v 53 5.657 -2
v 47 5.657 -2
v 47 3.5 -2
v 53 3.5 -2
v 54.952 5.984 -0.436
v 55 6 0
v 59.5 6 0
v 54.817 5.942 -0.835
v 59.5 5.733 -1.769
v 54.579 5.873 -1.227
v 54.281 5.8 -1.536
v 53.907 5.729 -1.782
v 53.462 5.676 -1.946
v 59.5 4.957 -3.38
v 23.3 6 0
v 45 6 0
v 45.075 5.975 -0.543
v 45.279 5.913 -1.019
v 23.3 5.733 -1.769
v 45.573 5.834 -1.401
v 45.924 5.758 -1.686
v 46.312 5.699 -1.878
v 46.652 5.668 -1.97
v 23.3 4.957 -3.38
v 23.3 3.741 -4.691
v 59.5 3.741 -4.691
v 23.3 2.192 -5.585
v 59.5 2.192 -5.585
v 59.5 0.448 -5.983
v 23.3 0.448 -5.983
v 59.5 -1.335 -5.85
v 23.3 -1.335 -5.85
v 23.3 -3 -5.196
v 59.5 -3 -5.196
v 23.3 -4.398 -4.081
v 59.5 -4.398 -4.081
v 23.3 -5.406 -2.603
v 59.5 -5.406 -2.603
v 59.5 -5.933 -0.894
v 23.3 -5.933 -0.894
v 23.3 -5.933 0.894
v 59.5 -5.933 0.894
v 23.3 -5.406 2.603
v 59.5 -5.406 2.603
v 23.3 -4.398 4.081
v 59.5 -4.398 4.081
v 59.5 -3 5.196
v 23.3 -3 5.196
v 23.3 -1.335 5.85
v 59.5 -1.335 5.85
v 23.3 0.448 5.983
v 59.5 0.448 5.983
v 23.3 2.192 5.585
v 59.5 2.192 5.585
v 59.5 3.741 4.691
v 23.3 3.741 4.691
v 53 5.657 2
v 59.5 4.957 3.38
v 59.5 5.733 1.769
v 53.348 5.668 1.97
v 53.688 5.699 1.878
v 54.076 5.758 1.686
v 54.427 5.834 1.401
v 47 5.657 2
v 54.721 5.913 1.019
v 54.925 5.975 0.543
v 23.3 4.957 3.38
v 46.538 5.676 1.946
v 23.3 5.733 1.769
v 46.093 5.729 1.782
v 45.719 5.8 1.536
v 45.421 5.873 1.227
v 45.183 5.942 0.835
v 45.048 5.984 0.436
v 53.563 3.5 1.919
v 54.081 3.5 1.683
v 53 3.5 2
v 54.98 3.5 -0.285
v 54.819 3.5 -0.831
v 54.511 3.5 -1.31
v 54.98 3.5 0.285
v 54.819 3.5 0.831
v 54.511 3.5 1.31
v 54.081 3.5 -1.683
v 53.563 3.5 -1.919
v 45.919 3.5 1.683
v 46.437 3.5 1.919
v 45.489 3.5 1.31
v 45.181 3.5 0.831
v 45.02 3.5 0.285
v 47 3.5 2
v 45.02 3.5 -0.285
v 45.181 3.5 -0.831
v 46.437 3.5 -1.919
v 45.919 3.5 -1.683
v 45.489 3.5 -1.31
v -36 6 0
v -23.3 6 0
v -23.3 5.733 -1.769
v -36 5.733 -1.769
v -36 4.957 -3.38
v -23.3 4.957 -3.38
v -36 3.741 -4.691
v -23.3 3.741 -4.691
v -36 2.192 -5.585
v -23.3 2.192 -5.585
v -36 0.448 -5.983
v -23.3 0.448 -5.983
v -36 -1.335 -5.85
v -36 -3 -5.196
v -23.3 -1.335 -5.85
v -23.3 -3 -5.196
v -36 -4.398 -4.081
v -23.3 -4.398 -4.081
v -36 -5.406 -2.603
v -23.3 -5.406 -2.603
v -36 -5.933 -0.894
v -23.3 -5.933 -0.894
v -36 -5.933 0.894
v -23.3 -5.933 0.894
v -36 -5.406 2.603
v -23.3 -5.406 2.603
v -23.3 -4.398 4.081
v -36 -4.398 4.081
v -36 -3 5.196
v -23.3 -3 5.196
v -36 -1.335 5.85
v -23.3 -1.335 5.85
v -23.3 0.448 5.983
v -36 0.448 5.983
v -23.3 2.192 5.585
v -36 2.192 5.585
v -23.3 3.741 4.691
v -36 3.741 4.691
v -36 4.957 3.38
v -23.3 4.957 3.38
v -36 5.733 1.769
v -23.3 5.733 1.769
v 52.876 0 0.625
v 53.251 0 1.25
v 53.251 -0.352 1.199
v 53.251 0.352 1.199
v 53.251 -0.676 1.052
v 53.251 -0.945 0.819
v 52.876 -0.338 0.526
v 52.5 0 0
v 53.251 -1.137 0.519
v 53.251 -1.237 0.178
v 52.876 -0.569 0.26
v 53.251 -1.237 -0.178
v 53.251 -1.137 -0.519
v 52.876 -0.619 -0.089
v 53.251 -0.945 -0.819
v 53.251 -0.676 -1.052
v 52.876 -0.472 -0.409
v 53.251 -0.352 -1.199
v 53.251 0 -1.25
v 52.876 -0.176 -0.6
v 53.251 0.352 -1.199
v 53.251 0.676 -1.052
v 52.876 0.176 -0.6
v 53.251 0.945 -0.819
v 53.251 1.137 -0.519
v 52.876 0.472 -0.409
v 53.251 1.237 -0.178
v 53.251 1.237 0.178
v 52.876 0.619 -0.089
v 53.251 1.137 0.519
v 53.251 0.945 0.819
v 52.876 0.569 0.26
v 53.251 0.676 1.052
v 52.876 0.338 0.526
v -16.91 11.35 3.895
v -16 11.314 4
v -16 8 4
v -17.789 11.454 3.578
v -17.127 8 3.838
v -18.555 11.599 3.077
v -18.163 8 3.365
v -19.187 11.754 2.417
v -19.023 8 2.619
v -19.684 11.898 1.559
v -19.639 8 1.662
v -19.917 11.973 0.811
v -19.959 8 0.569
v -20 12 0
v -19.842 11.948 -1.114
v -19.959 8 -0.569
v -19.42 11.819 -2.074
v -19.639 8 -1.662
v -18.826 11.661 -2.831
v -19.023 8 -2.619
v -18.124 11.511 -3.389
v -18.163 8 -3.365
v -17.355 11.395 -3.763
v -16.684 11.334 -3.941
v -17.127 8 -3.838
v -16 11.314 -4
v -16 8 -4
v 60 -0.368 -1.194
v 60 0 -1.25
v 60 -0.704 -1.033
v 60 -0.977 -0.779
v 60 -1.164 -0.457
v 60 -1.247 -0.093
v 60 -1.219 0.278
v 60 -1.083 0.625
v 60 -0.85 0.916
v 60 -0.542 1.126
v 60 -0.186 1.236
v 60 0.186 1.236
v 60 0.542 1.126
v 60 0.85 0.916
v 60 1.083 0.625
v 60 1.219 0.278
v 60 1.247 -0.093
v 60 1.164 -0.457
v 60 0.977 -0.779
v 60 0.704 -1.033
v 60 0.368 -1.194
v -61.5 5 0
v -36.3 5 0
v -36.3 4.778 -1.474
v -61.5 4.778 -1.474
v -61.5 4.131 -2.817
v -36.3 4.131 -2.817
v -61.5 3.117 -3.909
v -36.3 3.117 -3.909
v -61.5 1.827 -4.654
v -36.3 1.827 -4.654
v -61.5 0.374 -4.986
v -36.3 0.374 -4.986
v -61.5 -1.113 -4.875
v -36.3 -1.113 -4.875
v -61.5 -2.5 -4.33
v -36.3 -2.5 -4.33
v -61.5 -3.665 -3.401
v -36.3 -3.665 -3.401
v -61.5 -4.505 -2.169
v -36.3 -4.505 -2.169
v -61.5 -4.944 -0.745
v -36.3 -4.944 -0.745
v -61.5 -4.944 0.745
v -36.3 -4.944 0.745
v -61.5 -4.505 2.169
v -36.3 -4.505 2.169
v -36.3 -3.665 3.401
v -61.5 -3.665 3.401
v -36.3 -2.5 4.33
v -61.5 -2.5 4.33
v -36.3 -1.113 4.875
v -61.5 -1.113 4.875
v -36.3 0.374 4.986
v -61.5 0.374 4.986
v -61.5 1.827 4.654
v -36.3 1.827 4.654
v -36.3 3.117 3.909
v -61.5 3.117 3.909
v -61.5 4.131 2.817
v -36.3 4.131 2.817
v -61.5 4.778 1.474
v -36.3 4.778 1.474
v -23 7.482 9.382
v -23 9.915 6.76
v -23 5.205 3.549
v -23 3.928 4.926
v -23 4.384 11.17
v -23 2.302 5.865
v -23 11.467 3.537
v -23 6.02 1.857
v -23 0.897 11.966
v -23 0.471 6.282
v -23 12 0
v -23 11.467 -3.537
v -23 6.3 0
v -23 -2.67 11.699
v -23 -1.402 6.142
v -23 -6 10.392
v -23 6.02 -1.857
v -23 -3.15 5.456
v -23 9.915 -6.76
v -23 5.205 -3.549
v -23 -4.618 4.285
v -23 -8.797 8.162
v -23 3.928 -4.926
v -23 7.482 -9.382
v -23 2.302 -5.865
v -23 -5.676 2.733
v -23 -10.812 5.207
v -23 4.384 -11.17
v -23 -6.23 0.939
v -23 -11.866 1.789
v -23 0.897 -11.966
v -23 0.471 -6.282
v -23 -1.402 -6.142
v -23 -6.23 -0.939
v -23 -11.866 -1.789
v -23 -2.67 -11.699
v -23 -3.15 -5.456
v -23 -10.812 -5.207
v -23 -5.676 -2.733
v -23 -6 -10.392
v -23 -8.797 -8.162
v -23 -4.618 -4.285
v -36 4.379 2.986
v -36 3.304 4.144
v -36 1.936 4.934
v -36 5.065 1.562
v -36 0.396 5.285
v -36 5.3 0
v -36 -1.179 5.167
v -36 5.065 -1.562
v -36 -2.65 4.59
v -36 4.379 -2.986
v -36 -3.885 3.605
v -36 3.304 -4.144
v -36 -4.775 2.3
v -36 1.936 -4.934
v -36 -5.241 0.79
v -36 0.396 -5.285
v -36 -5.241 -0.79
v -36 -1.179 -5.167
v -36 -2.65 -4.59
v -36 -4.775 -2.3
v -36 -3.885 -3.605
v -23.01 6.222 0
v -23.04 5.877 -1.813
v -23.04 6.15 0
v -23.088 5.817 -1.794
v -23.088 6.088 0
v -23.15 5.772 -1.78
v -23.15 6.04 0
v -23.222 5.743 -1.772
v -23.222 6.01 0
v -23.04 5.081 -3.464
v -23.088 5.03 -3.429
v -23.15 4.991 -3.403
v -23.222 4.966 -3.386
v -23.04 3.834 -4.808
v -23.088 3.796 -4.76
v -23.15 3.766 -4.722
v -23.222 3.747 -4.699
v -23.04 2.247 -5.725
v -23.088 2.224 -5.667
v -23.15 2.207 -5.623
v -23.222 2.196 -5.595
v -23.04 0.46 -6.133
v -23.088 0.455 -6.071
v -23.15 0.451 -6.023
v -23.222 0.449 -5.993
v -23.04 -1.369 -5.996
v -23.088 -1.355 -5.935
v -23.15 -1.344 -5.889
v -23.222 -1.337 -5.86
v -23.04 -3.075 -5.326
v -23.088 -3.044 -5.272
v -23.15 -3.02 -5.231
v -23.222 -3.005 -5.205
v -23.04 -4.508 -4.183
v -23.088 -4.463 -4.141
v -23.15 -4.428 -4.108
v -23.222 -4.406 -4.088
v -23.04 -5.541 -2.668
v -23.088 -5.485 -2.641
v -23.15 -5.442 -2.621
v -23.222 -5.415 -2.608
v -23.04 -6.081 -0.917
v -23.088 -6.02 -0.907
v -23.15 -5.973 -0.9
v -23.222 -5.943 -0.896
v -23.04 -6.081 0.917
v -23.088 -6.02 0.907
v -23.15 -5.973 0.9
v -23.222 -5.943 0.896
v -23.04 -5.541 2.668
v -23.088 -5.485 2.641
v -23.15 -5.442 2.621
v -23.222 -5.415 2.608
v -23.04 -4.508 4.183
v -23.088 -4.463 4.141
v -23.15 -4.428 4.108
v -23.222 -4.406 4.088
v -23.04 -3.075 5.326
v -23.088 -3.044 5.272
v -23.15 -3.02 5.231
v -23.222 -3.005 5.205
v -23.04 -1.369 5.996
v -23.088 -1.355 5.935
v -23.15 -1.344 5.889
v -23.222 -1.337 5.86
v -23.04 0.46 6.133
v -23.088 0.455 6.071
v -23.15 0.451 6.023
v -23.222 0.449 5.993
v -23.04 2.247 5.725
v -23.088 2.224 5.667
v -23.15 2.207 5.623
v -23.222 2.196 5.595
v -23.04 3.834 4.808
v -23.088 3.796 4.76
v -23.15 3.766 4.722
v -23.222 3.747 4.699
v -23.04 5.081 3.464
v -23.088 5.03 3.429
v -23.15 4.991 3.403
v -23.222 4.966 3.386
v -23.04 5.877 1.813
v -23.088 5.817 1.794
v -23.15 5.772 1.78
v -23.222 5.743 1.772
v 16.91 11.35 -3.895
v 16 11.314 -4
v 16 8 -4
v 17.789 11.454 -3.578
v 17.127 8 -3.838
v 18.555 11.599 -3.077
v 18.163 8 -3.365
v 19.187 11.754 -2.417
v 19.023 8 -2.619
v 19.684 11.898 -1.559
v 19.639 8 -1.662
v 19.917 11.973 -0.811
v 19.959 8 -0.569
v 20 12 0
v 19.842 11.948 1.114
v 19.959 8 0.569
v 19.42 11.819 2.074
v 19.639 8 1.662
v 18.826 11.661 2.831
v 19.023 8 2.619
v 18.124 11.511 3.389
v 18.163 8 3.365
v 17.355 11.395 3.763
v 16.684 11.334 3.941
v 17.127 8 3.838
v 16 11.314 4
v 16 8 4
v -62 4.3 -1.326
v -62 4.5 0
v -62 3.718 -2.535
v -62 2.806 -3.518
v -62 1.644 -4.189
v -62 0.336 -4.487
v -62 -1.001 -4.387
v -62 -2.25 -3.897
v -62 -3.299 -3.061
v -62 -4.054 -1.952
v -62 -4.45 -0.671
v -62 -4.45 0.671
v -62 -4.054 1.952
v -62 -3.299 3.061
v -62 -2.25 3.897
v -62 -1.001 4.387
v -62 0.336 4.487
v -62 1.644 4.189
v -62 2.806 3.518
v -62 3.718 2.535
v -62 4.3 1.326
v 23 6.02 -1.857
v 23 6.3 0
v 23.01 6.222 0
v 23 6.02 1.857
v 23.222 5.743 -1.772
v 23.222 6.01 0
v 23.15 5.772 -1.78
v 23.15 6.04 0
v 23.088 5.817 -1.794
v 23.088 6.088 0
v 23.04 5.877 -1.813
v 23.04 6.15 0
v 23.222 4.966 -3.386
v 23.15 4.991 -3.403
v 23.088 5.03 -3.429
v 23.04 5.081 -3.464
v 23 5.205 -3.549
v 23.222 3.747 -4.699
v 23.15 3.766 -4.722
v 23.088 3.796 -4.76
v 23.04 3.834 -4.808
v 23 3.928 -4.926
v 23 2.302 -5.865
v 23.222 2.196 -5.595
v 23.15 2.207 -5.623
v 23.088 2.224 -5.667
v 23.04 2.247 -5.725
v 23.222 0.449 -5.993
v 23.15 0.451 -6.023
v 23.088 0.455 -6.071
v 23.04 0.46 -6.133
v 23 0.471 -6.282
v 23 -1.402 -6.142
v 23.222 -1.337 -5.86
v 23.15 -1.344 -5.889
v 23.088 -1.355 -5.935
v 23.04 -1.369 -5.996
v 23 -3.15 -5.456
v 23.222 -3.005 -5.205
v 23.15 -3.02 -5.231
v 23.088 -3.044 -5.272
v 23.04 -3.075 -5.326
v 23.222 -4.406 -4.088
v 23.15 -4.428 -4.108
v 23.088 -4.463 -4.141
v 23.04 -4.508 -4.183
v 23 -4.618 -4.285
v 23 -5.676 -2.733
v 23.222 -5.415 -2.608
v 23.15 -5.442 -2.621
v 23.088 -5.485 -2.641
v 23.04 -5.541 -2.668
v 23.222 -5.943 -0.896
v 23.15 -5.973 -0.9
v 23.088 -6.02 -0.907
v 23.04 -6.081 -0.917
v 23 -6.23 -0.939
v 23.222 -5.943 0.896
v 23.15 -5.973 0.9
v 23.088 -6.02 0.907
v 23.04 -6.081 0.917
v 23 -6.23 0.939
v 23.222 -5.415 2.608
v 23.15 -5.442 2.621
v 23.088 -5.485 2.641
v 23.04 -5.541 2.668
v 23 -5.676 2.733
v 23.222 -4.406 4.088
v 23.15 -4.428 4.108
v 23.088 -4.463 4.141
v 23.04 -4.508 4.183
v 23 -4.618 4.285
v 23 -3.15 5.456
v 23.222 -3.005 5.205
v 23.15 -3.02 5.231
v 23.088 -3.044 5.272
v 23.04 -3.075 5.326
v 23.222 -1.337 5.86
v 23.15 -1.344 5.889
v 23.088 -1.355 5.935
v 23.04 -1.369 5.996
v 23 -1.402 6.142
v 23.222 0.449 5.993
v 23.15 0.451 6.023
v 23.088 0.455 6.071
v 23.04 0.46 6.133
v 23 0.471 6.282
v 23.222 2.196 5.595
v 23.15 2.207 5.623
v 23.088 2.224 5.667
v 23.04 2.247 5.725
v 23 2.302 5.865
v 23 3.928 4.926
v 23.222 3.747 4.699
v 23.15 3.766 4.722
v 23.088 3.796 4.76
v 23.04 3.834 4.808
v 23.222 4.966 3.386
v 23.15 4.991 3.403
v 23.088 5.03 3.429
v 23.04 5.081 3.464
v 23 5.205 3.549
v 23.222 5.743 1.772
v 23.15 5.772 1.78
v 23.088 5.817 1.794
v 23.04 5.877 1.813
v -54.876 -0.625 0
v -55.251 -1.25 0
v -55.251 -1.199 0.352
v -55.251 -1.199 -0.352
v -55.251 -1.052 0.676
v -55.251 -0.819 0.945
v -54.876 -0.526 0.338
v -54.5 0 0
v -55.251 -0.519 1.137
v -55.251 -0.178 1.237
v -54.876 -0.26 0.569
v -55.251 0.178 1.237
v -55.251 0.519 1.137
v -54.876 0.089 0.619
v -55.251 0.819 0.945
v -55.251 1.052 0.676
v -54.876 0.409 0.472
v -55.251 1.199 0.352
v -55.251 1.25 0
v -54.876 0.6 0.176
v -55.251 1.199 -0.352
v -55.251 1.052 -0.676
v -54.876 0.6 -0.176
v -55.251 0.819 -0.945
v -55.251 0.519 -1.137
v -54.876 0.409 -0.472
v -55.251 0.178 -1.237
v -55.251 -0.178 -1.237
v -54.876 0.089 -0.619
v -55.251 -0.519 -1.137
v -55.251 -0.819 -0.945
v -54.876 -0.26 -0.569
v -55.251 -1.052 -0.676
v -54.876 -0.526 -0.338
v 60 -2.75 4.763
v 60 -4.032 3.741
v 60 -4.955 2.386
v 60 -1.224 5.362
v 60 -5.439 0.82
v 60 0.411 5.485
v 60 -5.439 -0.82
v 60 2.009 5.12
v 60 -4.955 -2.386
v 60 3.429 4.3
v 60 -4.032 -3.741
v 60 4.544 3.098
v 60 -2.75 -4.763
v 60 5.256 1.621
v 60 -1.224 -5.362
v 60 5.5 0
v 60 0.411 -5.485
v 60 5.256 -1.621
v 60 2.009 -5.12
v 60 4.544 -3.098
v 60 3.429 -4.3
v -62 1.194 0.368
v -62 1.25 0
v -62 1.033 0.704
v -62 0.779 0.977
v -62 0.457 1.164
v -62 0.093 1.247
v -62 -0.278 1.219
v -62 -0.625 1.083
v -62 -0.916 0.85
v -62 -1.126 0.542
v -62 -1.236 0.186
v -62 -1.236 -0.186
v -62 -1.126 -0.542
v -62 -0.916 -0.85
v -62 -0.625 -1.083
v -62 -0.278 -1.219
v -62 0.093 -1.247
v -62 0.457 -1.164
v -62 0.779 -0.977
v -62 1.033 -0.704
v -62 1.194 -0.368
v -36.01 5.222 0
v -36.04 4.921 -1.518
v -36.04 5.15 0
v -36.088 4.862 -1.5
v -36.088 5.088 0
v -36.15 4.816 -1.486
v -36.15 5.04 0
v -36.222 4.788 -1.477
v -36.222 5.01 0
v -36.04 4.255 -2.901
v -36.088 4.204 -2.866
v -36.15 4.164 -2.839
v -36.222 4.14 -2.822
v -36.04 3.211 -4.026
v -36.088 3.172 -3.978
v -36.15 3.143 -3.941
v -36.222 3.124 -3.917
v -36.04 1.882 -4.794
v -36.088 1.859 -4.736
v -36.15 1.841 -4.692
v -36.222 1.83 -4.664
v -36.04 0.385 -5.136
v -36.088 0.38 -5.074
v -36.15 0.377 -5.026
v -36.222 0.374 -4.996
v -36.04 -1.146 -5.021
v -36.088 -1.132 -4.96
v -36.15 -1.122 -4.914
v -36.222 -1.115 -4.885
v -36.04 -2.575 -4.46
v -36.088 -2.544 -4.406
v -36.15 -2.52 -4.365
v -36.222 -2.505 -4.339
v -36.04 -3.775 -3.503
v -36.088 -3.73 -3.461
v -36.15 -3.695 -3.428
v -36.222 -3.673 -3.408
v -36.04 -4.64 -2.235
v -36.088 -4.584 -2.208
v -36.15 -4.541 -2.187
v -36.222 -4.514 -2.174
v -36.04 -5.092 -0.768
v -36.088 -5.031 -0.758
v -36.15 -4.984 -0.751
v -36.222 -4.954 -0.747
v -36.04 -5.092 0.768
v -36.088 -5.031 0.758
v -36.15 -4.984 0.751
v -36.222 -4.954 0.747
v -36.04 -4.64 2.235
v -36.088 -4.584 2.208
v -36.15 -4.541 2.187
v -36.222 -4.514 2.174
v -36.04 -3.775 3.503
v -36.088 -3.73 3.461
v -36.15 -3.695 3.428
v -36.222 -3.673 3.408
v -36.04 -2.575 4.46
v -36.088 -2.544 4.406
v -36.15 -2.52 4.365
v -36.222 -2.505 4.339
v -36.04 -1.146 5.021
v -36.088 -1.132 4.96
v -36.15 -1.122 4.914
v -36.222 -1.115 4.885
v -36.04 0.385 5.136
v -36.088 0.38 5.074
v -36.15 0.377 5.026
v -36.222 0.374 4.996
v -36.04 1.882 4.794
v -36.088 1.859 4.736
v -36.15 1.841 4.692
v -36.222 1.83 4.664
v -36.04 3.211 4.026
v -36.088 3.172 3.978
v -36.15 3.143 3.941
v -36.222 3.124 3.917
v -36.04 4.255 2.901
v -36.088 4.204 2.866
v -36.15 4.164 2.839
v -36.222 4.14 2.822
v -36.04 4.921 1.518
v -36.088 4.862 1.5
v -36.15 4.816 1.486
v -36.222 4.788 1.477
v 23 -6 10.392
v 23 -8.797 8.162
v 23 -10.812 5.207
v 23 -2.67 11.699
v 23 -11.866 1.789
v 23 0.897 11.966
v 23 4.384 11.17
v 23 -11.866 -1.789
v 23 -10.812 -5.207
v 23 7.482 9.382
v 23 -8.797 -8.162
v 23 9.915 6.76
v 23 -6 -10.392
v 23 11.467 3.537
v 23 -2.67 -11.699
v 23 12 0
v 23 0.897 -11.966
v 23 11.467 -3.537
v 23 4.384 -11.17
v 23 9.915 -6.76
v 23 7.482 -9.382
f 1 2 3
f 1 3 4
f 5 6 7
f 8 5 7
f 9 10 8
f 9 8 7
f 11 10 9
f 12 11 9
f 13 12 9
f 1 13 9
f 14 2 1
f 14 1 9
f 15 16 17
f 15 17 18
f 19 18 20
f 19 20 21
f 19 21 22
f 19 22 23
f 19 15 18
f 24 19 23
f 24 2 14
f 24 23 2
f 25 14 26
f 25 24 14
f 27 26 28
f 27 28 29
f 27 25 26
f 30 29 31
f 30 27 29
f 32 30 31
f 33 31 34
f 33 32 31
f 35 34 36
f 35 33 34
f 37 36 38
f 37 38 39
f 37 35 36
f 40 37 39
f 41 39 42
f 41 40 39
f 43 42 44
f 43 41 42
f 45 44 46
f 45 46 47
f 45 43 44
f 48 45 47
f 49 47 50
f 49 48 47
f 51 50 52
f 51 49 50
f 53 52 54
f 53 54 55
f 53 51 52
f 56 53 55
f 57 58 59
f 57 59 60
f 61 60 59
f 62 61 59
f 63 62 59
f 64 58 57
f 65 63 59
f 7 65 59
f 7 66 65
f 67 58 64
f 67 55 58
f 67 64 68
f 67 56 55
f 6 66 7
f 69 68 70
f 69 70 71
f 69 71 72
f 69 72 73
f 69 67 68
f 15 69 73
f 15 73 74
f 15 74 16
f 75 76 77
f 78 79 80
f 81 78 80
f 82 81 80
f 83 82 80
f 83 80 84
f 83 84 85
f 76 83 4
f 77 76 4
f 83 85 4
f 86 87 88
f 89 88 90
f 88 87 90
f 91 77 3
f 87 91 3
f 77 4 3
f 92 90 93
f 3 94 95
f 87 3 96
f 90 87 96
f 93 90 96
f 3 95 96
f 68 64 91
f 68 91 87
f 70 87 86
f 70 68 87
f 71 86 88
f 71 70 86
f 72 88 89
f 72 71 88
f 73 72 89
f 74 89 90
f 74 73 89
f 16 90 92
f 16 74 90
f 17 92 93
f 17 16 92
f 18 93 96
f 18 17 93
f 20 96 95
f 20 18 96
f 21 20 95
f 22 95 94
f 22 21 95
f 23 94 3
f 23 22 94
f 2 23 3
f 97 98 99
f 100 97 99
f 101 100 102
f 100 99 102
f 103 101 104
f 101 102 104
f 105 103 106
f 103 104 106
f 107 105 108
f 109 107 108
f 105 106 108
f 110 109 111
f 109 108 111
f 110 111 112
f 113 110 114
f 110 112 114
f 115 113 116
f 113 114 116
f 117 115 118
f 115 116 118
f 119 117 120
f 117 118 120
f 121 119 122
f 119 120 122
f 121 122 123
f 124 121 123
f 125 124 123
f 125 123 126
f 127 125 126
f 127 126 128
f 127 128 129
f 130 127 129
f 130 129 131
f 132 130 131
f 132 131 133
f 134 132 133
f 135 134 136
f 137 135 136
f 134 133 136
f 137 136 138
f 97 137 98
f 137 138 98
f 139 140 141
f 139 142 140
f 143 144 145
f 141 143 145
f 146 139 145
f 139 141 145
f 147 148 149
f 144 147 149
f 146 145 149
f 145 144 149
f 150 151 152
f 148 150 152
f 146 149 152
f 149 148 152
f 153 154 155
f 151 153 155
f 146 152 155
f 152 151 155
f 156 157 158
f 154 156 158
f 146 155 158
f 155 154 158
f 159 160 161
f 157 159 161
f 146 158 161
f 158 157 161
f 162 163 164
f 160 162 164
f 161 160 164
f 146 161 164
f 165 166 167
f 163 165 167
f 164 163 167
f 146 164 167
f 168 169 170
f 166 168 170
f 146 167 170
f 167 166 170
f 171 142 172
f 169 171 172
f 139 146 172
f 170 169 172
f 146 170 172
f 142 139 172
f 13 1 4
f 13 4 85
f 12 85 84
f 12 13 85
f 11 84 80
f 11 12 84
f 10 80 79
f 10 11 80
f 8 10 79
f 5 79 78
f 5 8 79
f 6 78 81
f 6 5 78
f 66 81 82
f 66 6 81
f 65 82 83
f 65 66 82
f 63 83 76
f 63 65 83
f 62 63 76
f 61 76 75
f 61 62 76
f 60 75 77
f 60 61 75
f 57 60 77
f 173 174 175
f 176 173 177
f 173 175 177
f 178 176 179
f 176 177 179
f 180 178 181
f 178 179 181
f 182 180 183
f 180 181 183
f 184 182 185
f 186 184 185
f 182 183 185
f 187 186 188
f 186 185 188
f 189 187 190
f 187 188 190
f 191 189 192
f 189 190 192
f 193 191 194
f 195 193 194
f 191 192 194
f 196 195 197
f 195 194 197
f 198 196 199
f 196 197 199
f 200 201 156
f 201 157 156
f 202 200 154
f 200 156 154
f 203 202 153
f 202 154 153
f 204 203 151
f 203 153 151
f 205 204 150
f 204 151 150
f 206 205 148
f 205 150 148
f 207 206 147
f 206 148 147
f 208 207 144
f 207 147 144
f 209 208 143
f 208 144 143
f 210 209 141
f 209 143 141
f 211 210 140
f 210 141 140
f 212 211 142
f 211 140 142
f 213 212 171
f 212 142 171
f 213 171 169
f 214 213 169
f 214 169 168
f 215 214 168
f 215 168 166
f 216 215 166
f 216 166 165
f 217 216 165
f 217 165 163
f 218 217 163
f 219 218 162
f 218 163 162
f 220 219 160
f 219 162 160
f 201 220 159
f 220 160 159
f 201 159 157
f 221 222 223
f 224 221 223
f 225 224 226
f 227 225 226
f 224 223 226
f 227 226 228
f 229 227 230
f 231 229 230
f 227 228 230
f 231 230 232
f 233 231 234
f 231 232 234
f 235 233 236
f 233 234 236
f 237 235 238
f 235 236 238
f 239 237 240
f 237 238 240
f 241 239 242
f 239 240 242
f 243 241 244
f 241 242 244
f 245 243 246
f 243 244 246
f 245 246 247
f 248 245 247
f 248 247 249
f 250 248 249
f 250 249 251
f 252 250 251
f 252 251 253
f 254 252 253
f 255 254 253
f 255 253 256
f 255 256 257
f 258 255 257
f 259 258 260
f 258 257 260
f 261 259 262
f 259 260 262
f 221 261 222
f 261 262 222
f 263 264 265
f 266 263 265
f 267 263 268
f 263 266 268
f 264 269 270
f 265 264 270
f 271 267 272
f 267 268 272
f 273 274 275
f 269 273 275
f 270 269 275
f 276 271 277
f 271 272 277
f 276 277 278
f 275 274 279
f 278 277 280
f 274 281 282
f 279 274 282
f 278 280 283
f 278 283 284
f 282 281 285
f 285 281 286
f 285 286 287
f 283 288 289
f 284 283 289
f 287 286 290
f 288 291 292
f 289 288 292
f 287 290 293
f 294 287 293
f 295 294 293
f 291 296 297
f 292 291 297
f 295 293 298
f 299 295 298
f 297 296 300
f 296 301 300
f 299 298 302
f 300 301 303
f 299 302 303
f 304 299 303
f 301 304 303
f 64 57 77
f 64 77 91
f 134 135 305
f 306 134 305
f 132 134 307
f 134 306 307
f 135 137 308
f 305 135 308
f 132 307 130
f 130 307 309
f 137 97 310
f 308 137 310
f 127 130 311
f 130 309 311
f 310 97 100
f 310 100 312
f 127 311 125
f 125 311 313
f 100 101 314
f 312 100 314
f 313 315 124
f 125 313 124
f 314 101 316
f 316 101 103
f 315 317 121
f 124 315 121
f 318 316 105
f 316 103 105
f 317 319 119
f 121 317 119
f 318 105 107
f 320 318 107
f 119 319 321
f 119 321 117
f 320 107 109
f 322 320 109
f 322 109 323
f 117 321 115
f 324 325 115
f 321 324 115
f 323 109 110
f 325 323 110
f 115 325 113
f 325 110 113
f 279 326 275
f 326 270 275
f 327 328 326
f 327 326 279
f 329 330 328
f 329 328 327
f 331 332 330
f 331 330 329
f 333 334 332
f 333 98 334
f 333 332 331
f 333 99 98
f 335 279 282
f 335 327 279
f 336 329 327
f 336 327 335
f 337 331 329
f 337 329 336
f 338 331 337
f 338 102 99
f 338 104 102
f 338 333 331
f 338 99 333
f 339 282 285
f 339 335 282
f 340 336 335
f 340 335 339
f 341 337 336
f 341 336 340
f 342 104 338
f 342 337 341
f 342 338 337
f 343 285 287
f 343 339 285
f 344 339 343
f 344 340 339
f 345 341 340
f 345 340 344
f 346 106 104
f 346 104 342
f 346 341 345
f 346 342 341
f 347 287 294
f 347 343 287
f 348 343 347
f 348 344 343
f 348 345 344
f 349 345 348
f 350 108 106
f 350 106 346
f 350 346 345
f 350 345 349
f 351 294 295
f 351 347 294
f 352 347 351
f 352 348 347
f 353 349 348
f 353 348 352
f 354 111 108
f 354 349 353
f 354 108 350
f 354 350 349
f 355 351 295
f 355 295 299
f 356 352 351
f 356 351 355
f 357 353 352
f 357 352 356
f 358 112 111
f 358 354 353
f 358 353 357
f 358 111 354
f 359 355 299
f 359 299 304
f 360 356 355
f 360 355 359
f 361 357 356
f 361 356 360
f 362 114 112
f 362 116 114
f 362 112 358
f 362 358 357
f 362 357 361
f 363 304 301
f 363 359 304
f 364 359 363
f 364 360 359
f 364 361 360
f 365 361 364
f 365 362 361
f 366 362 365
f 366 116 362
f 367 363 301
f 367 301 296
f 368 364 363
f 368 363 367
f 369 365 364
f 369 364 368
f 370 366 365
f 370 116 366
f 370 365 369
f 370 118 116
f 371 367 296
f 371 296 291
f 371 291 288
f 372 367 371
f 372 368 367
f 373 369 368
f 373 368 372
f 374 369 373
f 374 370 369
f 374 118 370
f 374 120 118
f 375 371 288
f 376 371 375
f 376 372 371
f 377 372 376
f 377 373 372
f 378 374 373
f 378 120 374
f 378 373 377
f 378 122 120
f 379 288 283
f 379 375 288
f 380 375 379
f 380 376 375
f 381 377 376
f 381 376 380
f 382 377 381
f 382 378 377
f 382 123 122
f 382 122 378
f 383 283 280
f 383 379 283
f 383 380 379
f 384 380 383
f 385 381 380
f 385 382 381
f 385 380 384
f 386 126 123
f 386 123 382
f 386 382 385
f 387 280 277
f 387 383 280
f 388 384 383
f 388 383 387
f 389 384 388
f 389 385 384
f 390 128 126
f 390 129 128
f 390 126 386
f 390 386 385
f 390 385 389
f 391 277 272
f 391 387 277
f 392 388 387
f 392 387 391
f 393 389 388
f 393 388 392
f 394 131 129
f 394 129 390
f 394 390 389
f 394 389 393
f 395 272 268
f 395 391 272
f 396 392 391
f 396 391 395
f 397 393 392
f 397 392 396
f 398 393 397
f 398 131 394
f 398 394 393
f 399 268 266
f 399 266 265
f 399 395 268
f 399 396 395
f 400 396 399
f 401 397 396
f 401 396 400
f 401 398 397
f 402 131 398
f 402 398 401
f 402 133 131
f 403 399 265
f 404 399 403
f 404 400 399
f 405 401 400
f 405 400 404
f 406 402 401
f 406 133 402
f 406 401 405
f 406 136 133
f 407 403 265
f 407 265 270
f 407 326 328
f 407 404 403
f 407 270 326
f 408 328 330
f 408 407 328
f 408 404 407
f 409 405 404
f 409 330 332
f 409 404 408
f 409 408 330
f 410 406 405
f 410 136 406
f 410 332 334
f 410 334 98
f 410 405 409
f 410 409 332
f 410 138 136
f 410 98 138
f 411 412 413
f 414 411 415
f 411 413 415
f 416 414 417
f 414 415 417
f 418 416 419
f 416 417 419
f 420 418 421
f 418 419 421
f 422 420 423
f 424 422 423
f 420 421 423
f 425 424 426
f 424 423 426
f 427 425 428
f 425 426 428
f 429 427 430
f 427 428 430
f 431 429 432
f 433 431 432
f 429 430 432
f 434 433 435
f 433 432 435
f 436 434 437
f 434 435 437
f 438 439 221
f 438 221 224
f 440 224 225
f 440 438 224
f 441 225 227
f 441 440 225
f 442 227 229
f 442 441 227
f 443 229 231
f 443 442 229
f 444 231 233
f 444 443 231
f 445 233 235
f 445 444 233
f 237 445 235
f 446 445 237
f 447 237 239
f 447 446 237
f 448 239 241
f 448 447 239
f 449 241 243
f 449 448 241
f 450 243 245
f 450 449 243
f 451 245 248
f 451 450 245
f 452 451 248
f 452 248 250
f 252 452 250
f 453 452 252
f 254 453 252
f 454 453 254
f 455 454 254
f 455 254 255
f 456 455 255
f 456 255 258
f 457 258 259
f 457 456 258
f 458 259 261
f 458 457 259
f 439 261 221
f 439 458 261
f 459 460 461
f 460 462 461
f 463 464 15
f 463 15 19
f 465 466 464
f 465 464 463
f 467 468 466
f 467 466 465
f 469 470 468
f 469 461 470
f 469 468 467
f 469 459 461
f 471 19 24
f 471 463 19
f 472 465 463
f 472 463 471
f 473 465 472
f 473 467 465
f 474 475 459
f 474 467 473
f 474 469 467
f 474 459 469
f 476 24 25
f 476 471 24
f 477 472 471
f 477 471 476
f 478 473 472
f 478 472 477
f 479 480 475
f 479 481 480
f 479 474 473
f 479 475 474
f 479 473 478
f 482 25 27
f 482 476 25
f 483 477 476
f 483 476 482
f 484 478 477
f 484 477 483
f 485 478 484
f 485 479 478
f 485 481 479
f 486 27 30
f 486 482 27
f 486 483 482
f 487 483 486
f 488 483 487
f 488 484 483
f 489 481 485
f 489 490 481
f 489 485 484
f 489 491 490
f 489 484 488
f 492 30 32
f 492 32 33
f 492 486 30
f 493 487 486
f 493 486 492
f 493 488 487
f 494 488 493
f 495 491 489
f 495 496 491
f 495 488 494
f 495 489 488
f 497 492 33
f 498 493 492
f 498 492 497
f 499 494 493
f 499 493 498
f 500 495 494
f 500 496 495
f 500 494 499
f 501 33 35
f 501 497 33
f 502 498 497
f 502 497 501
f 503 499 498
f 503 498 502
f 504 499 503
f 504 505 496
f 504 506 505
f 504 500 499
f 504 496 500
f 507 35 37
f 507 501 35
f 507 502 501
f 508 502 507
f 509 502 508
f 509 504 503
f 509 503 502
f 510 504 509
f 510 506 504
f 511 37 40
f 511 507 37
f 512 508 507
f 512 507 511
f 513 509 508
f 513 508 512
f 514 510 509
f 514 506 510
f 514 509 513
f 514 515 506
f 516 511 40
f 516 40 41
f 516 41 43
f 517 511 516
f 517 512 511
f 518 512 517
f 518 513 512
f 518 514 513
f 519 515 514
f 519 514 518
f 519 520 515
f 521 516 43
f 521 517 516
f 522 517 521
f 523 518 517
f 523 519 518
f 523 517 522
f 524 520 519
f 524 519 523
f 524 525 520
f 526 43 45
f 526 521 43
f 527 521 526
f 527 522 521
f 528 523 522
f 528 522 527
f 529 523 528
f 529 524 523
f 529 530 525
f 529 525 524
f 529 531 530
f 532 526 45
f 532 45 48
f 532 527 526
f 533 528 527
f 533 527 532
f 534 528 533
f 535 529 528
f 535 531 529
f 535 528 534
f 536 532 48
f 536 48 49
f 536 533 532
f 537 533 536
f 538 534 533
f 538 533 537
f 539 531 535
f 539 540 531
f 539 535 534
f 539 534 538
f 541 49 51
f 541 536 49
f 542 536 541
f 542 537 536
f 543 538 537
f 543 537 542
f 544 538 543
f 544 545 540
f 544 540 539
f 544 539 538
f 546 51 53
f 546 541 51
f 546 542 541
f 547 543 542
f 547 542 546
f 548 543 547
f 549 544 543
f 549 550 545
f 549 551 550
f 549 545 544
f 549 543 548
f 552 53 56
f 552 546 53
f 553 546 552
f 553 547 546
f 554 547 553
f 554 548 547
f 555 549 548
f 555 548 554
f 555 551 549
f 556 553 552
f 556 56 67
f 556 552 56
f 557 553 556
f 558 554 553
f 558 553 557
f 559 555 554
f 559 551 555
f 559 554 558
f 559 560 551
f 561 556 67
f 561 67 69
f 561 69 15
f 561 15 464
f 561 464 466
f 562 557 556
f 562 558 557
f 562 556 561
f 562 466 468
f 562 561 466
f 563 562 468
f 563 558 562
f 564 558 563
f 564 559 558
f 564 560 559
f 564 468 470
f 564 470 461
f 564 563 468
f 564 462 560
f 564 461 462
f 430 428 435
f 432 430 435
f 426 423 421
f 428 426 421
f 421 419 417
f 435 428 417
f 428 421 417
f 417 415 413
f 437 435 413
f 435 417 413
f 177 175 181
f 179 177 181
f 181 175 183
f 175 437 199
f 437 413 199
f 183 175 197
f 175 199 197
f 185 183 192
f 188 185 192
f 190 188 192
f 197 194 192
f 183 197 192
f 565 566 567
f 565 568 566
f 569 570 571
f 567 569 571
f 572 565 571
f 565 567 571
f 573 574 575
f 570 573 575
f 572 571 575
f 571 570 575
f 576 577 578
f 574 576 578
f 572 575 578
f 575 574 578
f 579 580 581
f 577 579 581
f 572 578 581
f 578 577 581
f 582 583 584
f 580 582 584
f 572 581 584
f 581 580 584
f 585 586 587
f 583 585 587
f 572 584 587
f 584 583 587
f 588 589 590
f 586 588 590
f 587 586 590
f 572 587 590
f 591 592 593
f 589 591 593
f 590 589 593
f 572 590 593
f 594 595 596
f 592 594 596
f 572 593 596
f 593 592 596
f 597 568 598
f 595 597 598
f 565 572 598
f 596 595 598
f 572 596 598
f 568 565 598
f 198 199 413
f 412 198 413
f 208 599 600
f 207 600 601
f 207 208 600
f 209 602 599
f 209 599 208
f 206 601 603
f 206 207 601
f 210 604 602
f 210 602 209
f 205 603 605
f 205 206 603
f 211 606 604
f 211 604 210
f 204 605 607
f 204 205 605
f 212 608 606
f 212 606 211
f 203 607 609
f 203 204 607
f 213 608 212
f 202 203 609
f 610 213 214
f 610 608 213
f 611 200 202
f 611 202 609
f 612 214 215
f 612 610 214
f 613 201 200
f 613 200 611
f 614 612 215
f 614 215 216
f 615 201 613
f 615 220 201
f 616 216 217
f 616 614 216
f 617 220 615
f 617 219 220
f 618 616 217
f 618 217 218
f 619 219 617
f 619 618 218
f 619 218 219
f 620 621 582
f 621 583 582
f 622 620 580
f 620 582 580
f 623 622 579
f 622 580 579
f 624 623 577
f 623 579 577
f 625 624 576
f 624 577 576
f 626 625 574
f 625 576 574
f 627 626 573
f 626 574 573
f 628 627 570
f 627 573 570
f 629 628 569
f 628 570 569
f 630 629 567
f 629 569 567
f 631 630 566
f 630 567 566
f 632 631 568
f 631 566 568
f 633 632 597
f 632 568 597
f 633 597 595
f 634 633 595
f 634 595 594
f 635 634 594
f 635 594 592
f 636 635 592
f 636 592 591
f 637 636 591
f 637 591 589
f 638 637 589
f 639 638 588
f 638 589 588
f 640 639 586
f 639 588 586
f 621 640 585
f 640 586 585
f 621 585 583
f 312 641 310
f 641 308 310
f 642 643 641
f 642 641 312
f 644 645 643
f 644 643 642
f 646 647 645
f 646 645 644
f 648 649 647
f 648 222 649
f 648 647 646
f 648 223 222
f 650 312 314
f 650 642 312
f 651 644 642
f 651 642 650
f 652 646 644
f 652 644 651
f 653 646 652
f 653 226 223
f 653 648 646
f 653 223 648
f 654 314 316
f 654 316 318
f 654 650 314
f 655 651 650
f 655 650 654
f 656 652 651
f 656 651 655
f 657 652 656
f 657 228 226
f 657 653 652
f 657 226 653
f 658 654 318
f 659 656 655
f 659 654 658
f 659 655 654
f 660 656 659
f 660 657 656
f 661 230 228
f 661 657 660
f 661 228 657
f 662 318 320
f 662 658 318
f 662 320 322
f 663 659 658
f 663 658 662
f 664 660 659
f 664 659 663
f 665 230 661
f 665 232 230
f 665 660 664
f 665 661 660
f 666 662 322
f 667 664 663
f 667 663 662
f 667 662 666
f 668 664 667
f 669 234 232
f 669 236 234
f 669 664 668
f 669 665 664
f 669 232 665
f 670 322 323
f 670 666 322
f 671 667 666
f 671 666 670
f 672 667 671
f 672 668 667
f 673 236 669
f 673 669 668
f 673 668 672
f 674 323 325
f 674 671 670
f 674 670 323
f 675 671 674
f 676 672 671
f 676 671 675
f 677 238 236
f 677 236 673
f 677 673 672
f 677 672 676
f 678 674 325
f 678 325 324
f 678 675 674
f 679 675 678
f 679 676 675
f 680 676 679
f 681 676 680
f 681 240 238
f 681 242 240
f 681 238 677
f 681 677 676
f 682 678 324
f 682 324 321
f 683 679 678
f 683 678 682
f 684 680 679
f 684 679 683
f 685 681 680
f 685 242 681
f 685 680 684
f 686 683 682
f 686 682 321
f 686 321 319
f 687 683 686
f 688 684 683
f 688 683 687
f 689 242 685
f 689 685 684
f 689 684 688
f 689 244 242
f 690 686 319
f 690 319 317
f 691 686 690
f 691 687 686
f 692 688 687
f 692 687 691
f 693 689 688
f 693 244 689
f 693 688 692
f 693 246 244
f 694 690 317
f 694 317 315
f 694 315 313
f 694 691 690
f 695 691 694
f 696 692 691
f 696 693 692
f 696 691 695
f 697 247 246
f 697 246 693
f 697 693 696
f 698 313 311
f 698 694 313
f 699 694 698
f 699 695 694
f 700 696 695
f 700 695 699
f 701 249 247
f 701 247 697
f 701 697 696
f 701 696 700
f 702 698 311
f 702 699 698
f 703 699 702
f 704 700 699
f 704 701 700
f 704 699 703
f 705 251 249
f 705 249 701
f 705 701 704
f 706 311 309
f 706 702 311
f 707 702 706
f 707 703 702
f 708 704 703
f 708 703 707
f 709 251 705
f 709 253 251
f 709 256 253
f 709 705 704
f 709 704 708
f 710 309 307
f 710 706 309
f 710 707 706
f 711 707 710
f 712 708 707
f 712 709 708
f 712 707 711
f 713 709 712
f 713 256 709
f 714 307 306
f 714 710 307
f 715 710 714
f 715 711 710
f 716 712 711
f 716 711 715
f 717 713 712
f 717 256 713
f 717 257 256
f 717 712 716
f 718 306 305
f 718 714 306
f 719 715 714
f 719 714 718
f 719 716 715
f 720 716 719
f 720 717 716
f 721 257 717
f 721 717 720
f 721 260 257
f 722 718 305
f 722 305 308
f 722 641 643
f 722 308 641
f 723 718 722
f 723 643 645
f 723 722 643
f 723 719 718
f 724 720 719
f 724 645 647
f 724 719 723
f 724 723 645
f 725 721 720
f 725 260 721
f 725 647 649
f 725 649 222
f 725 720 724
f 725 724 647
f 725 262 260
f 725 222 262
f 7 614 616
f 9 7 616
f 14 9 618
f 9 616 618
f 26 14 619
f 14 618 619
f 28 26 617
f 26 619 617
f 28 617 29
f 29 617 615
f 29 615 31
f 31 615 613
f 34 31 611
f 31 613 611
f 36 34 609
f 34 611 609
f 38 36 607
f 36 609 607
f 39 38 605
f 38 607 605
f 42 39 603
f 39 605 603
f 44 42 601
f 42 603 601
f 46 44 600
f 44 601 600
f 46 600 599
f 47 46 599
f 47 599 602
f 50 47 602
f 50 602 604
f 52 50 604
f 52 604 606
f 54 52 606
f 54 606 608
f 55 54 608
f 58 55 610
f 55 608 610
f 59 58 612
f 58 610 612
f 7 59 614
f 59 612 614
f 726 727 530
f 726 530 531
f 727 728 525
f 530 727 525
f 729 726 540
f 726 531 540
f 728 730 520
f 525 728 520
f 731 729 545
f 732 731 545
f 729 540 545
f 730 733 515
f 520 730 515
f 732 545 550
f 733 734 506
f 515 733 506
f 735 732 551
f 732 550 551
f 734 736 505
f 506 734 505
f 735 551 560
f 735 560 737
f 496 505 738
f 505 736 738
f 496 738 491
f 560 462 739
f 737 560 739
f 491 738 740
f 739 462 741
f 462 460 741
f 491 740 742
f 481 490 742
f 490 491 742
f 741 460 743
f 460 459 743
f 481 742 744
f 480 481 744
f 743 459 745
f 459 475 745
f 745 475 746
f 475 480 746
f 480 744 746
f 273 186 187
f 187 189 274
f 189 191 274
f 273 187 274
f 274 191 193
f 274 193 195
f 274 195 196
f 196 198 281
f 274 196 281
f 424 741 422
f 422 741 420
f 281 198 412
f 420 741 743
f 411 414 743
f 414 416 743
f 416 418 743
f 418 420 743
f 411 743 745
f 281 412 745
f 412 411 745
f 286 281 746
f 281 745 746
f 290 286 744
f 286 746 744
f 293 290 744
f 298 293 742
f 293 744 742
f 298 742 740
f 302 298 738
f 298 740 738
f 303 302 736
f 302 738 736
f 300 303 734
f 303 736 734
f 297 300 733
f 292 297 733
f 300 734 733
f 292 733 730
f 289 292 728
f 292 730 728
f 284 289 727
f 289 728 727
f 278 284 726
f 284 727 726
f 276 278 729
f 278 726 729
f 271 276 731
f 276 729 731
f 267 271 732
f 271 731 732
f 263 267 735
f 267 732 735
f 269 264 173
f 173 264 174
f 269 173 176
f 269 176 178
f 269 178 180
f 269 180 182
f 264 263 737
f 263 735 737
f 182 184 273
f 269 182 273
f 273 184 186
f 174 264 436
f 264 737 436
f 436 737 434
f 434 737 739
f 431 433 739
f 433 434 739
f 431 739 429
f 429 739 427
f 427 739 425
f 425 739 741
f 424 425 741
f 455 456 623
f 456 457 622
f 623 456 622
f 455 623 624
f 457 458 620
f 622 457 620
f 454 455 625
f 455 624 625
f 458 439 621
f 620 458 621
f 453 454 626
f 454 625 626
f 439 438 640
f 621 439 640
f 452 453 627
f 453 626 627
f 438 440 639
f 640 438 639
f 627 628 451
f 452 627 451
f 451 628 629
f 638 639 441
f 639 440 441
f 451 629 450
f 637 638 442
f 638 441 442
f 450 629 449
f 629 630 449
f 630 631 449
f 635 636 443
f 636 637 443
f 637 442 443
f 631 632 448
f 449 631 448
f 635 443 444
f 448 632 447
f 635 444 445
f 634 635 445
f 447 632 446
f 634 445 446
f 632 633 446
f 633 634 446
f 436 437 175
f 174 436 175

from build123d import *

# Parameters (mm, degrees)
CUT_EXTRUDE1_START              = 8
CUT_EXTRUDE1_DEPTH              = 4
SKETCH3_W                       = 8
SKETCH3_H                       = 5
CUT_EXTRUDE2_DEPTH              = 10
SKETCH4_R                       = 1.25
CUT_EXTRUDE3_DEPTH              = 4
SKETCH5_R                       = 6
CUT_EXTRUDE4_DEPTH              = 10
CUT_EXTRUDE5_START              = 6
CUT_EXTRUDE5_DEPTH              = 2.5
M3_TAPPED_HOLE1_D               = 2.5
M3_TAPPED_HOLE1_DEPTH           = 6.748924226
M3_TAPPED_HOLE1_TIP             = 0.751075774
M3_TAPPED_HOLE1_ON_FACE_2_D     = 2.5
M3_TAPPED_HOLE1_ON_FACE_2_DEPTH = 6.748924226
M3_TAPPED_HOLE1_ON_FACE_2_TIP   = 0.751075774
CHAMFER1_SIZE                   = 0.5
FILLET1_R                       = 0.3


with BuildPart() as part:
    # Sketch1 → Revolve1 (revolve)
    with BuildSketch(Plane.XY):
        Polygon((26, 6), (60, 6), (70, 6), (70, 0), (60, 0), (-60, 0), (-62, 0), (-62, 5), (-36, 5), (-36, 6), (-23, 6), (-23, 12), (23, 12), (23, 6), align=None)
    revolve(axis=Axis((60, 0, 0), (-1, 0, 0)))

    # Sketch2 → Cut-Extrude1 (cut)
    with BuildSketch(Plane(origin=(0, 0, 0), x_dir=(1, 0, 0), z_dir=(0, 1, 0)).offset(CUT_EXTRUDE1_START)):
        with BuildLine():
            Line((-16, 4), (16, 4))
            ThreePointArc((16, 4), (20, 0), (16, -4))
            Line((16, -4), (-16, -4))
            ThreePointArc((-16, -4), (-20, 0), (-16, 4))
        make_face()
    extrude(amount=CUT_EXTRUDE1_DEPTH, mode=Mode.SUBTRACT)

    # Sketch3 → Cut-Extrude2 (cut)
    with BuildSketch(Plane(origin=(70, 0, 0), x_dir=(0, 0, -1), z_dir=(1, 0, 0))):
        with Locations((0, 7)):
            Rectangle(SKETCH3_W, SKETCH3_H)
    extrude(amount=-CUT_EXTRUDE2_DEPTH, mode=Mode.SUBTRACT)

    # Sketch4 → Cut-Extrude3 (cut)
    with BuildSketch(Plane(origin=(0, 4.5, 0), x_dir=(1, 0, 0), z_dir=(0, 1, 0))):
        with Locations((65, 0)):
            Circle(SKETCH4_R)
    extrude(amount=-CUT_EXTRUDE3_DEPTH, mode=Mode.SUBTRACT)

    # Sketch5 → Cut-Extrude4 (cut)
    with BuildSketch(Plane(origin=(60, 0, 0), x_dir=(0, 0, -1), z_dir=(1, 0, 0))):
        Circle(SKETCH5_R)
    extrude(amount=CUT_EXTRUDE4_DEPTH, mode=Mode.SUBTRACT)

    # Sketch7 → Cut-Extrude5 (cut)
    with BuildSketch(Plane(origin=(0, 0, 0), x_dir=(1, 0, 0), z_dir=(0, 1, 0)).offset(CUT_EXTRUDE5_START)):
        with BuildLine():
            Line((47, 2), (53, 2))
            ThreePointArc((53, 2), (55, 0), (53, -2))
            Line((53, -2), (47, -2))
            ThreePointArc((47, -2), (45, 0), (47, 2))
        make_face()
    extrude(amount=-CUT_EXTRUDE5_DEPTH, mode=Mode.SUBTRACT)

    # M3 Tapped Hole1
    with Locations(Plane(origin=(-62, 0, 0), x_dir=(0, -1, 0), z_dir=(-1, 0, 0))):
        with Locations((0, 0)):
            Hole(M3_TAPPED_HOLE1_D / 2, depth=M3_TAPPED_HOLE1_DEPTH)
            with Locations((0, 0, -(M3_TAPPED_HOLE1_DEPTH + M3_TAPPED_HOLE1_TIP / 2))):  # 118° drill point
                Cone(0, M3_TAPPED_HOLE1_D / 2, M3_TAPPED_HOLE1_TIP, mode=Mode.SUBTRACT)

    # M3 Tapped Hole1 on face 2
    with Locations(Plane(origin=(60, 0, 0), x_dir=(0, 0, 1), z_dir=(1, 0, 0))):
        with Locations((0, 0)):
            Hole(M3_TAPPED_HOLE1_ON_FACE_2_D / 2, depth=M3_TAPPED_HOLE1_ON_FACE_2_DEPTH)
            with Locations((0, 0, -(M3_TAPPED_HOLE1_ON_FACE_2_DEPTH + M3_TAPPED_HOLE1_ON_FACE_2_TIP / 2))):  # 118° drill point
                Cone(0, M3_TAPPED_HOLE1_ON_FACE_2_D / 2, M3_TAPPED_HOLE1_ON_FACE_2_TIP, mode=Mode.SUBTRACT)

    # Chamfer1
    chamfer1_edges = [part.edges().sort_by_distance(p)[0] for p in [
        (-62, -5, 0),
        (60, -6, 0),
    ]]
    chamfer(chamfer1_edges, length=CHAMFER1_SIZE)

    # Fillet1
    fillet1_edges = [part.edges().sort_by_distance(p)[0] for p in [
        (-36, -5, 0),
        (-23, -6, 0),
        (23, -6, 0),
    ]]
    fillet(fillet1_edges, radius=FILLET1_R)


solid = part.part
